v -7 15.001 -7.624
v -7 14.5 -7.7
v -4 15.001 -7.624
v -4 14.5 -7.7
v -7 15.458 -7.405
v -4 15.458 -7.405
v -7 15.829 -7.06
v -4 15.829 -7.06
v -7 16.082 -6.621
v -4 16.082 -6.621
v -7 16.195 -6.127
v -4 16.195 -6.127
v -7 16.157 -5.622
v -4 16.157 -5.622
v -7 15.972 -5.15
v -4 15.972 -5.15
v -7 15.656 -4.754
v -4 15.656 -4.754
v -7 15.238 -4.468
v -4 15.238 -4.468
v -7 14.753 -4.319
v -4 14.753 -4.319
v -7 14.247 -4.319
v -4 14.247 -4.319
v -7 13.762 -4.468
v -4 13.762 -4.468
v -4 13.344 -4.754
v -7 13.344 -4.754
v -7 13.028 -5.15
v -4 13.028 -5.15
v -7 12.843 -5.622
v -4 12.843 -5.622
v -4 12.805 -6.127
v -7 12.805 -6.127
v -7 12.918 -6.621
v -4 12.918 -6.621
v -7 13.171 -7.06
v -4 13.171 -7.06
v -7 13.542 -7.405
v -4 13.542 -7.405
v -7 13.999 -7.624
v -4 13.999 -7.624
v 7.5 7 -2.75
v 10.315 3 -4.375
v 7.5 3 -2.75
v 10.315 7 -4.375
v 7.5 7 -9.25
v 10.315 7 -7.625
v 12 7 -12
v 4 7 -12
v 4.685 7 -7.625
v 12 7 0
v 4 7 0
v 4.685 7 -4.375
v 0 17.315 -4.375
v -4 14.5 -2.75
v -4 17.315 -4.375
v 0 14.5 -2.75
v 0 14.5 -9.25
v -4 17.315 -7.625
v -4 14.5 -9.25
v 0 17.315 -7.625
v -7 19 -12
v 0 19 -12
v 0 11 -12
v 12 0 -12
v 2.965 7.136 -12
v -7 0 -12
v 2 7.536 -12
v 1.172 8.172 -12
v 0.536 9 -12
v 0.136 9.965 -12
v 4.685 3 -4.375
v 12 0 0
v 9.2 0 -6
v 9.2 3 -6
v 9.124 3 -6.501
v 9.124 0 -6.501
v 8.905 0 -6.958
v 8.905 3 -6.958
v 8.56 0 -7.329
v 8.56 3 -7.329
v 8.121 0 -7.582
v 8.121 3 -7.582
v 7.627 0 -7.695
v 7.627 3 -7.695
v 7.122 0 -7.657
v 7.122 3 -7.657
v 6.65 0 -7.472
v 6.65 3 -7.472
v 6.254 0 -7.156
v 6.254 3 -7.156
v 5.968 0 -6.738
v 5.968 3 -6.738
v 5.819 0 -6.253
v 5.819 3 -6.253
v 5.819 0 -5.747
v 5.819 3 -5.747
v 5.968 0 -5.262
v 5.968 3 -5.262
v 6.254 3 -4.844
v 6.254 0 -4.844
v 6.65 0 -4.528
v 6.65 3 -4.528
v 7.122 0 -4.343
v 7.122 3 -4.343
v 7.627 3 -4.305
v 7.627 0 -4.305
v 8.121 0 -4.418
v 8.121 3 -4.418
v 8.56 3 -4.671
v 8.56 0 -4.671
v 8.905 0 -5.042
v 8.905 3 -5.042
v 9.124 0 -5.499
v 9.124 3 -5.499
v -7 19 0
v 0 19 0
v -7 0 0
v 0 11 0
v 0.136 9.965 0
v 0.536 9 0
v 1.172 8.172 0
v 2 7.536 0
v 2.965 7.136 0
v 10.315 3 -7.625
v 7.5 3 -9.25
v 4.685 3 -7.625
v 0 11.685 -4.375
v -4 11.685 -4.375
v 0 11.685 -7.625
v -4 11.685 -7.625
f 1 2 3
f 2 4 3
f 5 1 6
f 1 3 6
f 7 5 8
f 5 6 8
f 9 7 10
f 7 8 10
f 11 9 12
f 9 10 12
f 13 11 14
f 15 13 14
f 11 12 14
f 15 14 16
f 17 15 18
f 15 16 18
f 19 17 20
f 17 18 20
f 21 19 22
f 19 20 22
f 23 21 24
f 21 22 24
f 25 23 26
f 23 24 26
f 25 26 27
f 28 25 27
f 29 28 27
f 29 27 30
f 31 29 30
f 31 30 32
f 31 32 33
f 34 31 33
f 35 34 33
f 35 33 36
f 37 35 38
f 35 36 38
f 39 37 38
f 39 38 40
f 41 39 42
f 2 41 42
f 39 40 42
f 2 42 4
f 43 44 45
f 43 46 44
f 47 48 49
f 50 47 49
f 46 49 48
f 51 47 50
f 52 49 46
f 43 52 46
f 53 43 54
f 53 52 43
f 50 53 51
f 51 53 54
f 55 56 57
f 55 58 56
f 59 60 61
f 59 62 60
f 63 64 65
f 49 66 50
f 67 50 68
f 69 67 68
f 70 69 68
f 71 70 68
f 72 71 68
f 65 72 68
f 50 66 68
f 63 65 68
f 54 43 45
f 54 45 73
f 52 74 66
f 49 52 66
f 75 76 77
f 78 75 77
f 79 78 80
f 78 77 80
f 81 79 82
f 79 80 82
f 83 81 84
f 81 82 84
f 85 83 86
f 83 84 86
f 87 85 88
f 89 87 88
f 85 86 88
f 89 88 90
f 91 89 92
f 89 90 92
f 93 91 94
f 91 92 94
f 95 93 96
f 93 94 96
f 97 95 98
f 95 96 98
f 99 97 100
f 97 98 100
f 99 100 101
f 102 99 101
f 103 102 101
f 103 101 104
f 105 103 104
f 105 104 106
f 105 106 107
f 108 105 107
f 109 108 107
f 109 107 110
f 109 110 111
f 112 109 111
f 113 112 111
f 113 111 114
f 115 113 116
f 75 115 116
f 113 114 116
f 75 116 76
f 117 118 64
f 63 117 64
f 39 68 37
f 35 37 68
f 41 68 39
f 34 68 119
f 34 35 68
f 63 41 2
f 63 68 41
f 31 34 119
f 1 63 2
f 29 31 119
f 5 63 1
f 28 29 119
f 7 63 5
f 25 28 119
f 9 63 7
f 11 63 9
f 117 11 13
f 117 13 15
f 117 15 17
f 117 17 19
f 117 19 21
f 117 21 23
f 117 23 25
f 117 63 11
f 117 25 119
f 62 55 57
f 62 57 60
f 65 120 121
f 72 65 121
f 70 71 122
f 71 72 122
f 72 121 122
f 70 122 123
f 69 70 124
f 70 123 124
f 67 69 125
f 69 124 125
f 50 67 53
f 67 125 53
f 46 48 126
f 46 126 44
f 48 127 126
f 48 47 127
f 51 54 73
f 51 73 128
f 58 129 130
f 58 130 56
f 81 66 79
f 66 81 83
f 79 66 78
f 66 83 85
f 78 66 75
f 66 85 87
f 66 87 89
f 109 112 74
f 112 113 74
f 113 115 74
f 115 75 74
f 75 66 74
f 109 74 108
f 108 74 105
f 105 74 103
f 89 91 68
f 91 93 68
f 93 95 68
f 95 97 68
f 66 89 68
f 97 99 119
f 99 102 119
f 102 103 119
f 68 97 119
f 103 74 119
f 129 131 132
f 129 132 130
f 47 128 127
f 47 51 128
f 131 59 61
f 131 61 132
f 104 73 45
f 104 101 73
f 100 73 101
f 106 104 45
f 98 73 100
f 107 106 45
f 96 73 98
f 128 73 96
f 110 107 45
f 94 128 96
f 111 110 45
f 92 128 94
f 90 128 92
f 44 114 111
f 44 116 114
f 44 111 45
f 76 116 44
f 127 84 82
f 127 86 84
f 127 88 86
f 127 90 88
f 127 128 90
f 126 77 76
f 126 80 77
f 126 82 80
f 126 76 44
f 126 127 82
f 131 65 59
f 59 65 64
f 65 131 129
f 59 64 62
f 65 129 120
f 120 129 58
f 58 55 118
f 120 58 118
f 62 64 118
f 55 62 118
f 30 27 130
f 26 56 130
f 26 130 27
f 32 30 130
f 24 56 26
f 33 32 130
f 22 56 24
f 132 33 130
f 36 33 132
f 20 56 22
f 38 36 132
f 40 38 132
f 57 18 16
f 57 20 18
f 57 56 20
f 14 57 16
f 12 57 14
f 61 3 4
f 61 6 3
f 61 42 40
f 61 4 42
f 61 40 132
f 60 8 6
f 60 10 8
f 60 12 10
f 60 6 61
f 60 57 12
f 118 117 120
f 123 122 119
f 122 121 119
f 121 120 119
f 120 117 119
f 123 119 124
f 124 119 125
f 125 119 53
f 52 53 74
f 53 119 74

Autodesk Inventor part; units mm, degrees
ref_plane "YZ Plane" through (0, 0, 0) normal (1, 0, 0) x (0, 1, 0)
ref_plane "XZ Plane" through (0, 0, 0) normal (0, 1, 0) x (-1, 0, 0)
ref_plane "XY Plane" through (0, 0, 0) normal (0, 0, 1) x (1, 0, 0)
sketch "Sketch1" plane through (0, 0, 0) normal (0, 1, 0) x (-1, 0, 0)
  line L0 (0, 0) -> (-12, 0)
  line L1 (-12, 0) -> (-12, -12)
  line L2 (-12, -12) -> (0, -12)
  line L3 (0, -12) -> (0, 0)
  dimension "d0" = 12
  dimension "d1" = 12
extrude "Extrusion1" add sketch "Sketch1" along normal blind 7
sketch "Sketch2" plane through (0, 0, -12) normal (-1, 0, 0) x (0, 0, 1)
  line L0 (12, 0) -> (0, 0) projected
  line L1 (0, 0) -> (12, 0)
  line L2 (12, 0) -> (12, 19)
  line L3 (12, 19) -> (0, 19)
  line L4 (0, 19) -> (0, 0)
  dimension "d4" = 12
  dimension "d5" = 19
extrude "Extrusion2" add sketch "Sketch2" along normal blind 7
sketch "Sketch3" plane through (0, 0, -12) normal (1, 0, 0) x (0, 0, -1)
  circle A0 centre (-6, 14.5) radius 3.25 construction
  line L0 (-12, 19) -> (0, 19) construction
  line L1 (-12, 7) -> (-12, 19) construction
  line L2 (-2.75, 14.5) -> (-4.375, 11.6854)
  line L3 (-4.375, 11.6854) -> (-7.625, 11.6854)
  line L4 (-7.625, 11.6854) -> (-9.25, 14.5)
  line L5 (-9.25, 14.5) -> (-7.625, 17.3146)
  line L6 (-7.625, 17.3146) -> (-4.375, 17.3146)
  line L7 (-4.375, 17.3146) -> (-2.75, 14.5)
  point P0 (-12, 0)
  dimension "d8" = 6.5
  dimension "d9" = 4.5
  dimension "d10" = 6
extrude "Extrusion3" cut sketch "Sketch3" against normal blind 4
sketch "Sketch4" plane through (0, 7, 0) normal (0, 1, 0) x (1, 0, 0)
  circle A0 centre (7.5, 6) radius 3.25 construction
  line L0 (12, 0) -> (12, 12) construction
  line L1 (12, 12) -> (0, 12) construction
  line L2 (0, 0) -> (12, 0) construction
  line L3 (7.5, 9.25) -> (10.3146, 7.625)
  line L4 (10.3146, 7.625) -> (10.3146, 4.375)
  line L5 (10.3146, 4.375) -> (7.5, 2.75)
  line L6 (7.5, 2.75) -> (4.6854, 4.375)
  line L7 (4.6854, 4.375) -> (4.6854, 7.625)
  line L8 (4.6854, 7.625) -> (7.5, 9.25)
  dimension "d13" = 6.5
  dimension "d14" = 4.5
  dimension "d15" = 6
  dimension "d16" = 12
extrude "Extrusion4" cut sketch "Sketch4" against normal blind 4
fillet "Fillet1" radius 4 1 edges at (0, 7, -6)
sketch "Sketch7" plane through (0, 0, -12) normal (1, 0, 0) x (0, 0, -1)
  line L0 (-9.25, 14.5) -> (-7.625, 17.3146) construction
  line L1 (-4.375, 17.3146) -> (-2.75, 14.5) construction
  line L2 (-9.25, 14.5) -> (-2.75, 14.5) construction
  line L3 (-7.625, 17.3146) -> (-4.375, 17.3146) construction
  line L4 (-4.375, 11.6854) -> (-7.625, 11.6854) construction
  line L5 (-4.375, 17.3146) -> (-7.625, 11.6854) construction
  circle A0 centre (-6, 14.5) radius 1.7
  point P0 (-12, 0)
  dimension "d24" = 3.4
extrude "Extrusion7" cut sketch "Sketch7" against normal through all
sketch "Sketch8" plane through (0, 7, 0) normal (0, 1, 0) x (1, 0, 0)
  line L0 (7.5, 9.25) -> (10.3146, 7.625) construction
  line L1 (4.6854, 4.375) -> (4.6854, 7.625) construction
  line L2 (10.3146, 7.625) -> (4.6854, 4.375) construction
  line L3 (4.6854, 7.625) -> (7.5, 9.25) construction
  line L4 (10.3146, 7.625) -> (10.3146, 4.375) construction
  line L5 (4.6854, 7.625) -> (10.3146, 4.375) construction
  circle A0 centre (7.5, 6) radius 1.7
  point P0 (0, 0)
  dimension "d27" = 3.4
extrude "Extrusion8" cut sketch "Sketch8" against normal through all
equation "\"d15\" = 0.5 * d16"
properties part number "wheel box lid bracket"
